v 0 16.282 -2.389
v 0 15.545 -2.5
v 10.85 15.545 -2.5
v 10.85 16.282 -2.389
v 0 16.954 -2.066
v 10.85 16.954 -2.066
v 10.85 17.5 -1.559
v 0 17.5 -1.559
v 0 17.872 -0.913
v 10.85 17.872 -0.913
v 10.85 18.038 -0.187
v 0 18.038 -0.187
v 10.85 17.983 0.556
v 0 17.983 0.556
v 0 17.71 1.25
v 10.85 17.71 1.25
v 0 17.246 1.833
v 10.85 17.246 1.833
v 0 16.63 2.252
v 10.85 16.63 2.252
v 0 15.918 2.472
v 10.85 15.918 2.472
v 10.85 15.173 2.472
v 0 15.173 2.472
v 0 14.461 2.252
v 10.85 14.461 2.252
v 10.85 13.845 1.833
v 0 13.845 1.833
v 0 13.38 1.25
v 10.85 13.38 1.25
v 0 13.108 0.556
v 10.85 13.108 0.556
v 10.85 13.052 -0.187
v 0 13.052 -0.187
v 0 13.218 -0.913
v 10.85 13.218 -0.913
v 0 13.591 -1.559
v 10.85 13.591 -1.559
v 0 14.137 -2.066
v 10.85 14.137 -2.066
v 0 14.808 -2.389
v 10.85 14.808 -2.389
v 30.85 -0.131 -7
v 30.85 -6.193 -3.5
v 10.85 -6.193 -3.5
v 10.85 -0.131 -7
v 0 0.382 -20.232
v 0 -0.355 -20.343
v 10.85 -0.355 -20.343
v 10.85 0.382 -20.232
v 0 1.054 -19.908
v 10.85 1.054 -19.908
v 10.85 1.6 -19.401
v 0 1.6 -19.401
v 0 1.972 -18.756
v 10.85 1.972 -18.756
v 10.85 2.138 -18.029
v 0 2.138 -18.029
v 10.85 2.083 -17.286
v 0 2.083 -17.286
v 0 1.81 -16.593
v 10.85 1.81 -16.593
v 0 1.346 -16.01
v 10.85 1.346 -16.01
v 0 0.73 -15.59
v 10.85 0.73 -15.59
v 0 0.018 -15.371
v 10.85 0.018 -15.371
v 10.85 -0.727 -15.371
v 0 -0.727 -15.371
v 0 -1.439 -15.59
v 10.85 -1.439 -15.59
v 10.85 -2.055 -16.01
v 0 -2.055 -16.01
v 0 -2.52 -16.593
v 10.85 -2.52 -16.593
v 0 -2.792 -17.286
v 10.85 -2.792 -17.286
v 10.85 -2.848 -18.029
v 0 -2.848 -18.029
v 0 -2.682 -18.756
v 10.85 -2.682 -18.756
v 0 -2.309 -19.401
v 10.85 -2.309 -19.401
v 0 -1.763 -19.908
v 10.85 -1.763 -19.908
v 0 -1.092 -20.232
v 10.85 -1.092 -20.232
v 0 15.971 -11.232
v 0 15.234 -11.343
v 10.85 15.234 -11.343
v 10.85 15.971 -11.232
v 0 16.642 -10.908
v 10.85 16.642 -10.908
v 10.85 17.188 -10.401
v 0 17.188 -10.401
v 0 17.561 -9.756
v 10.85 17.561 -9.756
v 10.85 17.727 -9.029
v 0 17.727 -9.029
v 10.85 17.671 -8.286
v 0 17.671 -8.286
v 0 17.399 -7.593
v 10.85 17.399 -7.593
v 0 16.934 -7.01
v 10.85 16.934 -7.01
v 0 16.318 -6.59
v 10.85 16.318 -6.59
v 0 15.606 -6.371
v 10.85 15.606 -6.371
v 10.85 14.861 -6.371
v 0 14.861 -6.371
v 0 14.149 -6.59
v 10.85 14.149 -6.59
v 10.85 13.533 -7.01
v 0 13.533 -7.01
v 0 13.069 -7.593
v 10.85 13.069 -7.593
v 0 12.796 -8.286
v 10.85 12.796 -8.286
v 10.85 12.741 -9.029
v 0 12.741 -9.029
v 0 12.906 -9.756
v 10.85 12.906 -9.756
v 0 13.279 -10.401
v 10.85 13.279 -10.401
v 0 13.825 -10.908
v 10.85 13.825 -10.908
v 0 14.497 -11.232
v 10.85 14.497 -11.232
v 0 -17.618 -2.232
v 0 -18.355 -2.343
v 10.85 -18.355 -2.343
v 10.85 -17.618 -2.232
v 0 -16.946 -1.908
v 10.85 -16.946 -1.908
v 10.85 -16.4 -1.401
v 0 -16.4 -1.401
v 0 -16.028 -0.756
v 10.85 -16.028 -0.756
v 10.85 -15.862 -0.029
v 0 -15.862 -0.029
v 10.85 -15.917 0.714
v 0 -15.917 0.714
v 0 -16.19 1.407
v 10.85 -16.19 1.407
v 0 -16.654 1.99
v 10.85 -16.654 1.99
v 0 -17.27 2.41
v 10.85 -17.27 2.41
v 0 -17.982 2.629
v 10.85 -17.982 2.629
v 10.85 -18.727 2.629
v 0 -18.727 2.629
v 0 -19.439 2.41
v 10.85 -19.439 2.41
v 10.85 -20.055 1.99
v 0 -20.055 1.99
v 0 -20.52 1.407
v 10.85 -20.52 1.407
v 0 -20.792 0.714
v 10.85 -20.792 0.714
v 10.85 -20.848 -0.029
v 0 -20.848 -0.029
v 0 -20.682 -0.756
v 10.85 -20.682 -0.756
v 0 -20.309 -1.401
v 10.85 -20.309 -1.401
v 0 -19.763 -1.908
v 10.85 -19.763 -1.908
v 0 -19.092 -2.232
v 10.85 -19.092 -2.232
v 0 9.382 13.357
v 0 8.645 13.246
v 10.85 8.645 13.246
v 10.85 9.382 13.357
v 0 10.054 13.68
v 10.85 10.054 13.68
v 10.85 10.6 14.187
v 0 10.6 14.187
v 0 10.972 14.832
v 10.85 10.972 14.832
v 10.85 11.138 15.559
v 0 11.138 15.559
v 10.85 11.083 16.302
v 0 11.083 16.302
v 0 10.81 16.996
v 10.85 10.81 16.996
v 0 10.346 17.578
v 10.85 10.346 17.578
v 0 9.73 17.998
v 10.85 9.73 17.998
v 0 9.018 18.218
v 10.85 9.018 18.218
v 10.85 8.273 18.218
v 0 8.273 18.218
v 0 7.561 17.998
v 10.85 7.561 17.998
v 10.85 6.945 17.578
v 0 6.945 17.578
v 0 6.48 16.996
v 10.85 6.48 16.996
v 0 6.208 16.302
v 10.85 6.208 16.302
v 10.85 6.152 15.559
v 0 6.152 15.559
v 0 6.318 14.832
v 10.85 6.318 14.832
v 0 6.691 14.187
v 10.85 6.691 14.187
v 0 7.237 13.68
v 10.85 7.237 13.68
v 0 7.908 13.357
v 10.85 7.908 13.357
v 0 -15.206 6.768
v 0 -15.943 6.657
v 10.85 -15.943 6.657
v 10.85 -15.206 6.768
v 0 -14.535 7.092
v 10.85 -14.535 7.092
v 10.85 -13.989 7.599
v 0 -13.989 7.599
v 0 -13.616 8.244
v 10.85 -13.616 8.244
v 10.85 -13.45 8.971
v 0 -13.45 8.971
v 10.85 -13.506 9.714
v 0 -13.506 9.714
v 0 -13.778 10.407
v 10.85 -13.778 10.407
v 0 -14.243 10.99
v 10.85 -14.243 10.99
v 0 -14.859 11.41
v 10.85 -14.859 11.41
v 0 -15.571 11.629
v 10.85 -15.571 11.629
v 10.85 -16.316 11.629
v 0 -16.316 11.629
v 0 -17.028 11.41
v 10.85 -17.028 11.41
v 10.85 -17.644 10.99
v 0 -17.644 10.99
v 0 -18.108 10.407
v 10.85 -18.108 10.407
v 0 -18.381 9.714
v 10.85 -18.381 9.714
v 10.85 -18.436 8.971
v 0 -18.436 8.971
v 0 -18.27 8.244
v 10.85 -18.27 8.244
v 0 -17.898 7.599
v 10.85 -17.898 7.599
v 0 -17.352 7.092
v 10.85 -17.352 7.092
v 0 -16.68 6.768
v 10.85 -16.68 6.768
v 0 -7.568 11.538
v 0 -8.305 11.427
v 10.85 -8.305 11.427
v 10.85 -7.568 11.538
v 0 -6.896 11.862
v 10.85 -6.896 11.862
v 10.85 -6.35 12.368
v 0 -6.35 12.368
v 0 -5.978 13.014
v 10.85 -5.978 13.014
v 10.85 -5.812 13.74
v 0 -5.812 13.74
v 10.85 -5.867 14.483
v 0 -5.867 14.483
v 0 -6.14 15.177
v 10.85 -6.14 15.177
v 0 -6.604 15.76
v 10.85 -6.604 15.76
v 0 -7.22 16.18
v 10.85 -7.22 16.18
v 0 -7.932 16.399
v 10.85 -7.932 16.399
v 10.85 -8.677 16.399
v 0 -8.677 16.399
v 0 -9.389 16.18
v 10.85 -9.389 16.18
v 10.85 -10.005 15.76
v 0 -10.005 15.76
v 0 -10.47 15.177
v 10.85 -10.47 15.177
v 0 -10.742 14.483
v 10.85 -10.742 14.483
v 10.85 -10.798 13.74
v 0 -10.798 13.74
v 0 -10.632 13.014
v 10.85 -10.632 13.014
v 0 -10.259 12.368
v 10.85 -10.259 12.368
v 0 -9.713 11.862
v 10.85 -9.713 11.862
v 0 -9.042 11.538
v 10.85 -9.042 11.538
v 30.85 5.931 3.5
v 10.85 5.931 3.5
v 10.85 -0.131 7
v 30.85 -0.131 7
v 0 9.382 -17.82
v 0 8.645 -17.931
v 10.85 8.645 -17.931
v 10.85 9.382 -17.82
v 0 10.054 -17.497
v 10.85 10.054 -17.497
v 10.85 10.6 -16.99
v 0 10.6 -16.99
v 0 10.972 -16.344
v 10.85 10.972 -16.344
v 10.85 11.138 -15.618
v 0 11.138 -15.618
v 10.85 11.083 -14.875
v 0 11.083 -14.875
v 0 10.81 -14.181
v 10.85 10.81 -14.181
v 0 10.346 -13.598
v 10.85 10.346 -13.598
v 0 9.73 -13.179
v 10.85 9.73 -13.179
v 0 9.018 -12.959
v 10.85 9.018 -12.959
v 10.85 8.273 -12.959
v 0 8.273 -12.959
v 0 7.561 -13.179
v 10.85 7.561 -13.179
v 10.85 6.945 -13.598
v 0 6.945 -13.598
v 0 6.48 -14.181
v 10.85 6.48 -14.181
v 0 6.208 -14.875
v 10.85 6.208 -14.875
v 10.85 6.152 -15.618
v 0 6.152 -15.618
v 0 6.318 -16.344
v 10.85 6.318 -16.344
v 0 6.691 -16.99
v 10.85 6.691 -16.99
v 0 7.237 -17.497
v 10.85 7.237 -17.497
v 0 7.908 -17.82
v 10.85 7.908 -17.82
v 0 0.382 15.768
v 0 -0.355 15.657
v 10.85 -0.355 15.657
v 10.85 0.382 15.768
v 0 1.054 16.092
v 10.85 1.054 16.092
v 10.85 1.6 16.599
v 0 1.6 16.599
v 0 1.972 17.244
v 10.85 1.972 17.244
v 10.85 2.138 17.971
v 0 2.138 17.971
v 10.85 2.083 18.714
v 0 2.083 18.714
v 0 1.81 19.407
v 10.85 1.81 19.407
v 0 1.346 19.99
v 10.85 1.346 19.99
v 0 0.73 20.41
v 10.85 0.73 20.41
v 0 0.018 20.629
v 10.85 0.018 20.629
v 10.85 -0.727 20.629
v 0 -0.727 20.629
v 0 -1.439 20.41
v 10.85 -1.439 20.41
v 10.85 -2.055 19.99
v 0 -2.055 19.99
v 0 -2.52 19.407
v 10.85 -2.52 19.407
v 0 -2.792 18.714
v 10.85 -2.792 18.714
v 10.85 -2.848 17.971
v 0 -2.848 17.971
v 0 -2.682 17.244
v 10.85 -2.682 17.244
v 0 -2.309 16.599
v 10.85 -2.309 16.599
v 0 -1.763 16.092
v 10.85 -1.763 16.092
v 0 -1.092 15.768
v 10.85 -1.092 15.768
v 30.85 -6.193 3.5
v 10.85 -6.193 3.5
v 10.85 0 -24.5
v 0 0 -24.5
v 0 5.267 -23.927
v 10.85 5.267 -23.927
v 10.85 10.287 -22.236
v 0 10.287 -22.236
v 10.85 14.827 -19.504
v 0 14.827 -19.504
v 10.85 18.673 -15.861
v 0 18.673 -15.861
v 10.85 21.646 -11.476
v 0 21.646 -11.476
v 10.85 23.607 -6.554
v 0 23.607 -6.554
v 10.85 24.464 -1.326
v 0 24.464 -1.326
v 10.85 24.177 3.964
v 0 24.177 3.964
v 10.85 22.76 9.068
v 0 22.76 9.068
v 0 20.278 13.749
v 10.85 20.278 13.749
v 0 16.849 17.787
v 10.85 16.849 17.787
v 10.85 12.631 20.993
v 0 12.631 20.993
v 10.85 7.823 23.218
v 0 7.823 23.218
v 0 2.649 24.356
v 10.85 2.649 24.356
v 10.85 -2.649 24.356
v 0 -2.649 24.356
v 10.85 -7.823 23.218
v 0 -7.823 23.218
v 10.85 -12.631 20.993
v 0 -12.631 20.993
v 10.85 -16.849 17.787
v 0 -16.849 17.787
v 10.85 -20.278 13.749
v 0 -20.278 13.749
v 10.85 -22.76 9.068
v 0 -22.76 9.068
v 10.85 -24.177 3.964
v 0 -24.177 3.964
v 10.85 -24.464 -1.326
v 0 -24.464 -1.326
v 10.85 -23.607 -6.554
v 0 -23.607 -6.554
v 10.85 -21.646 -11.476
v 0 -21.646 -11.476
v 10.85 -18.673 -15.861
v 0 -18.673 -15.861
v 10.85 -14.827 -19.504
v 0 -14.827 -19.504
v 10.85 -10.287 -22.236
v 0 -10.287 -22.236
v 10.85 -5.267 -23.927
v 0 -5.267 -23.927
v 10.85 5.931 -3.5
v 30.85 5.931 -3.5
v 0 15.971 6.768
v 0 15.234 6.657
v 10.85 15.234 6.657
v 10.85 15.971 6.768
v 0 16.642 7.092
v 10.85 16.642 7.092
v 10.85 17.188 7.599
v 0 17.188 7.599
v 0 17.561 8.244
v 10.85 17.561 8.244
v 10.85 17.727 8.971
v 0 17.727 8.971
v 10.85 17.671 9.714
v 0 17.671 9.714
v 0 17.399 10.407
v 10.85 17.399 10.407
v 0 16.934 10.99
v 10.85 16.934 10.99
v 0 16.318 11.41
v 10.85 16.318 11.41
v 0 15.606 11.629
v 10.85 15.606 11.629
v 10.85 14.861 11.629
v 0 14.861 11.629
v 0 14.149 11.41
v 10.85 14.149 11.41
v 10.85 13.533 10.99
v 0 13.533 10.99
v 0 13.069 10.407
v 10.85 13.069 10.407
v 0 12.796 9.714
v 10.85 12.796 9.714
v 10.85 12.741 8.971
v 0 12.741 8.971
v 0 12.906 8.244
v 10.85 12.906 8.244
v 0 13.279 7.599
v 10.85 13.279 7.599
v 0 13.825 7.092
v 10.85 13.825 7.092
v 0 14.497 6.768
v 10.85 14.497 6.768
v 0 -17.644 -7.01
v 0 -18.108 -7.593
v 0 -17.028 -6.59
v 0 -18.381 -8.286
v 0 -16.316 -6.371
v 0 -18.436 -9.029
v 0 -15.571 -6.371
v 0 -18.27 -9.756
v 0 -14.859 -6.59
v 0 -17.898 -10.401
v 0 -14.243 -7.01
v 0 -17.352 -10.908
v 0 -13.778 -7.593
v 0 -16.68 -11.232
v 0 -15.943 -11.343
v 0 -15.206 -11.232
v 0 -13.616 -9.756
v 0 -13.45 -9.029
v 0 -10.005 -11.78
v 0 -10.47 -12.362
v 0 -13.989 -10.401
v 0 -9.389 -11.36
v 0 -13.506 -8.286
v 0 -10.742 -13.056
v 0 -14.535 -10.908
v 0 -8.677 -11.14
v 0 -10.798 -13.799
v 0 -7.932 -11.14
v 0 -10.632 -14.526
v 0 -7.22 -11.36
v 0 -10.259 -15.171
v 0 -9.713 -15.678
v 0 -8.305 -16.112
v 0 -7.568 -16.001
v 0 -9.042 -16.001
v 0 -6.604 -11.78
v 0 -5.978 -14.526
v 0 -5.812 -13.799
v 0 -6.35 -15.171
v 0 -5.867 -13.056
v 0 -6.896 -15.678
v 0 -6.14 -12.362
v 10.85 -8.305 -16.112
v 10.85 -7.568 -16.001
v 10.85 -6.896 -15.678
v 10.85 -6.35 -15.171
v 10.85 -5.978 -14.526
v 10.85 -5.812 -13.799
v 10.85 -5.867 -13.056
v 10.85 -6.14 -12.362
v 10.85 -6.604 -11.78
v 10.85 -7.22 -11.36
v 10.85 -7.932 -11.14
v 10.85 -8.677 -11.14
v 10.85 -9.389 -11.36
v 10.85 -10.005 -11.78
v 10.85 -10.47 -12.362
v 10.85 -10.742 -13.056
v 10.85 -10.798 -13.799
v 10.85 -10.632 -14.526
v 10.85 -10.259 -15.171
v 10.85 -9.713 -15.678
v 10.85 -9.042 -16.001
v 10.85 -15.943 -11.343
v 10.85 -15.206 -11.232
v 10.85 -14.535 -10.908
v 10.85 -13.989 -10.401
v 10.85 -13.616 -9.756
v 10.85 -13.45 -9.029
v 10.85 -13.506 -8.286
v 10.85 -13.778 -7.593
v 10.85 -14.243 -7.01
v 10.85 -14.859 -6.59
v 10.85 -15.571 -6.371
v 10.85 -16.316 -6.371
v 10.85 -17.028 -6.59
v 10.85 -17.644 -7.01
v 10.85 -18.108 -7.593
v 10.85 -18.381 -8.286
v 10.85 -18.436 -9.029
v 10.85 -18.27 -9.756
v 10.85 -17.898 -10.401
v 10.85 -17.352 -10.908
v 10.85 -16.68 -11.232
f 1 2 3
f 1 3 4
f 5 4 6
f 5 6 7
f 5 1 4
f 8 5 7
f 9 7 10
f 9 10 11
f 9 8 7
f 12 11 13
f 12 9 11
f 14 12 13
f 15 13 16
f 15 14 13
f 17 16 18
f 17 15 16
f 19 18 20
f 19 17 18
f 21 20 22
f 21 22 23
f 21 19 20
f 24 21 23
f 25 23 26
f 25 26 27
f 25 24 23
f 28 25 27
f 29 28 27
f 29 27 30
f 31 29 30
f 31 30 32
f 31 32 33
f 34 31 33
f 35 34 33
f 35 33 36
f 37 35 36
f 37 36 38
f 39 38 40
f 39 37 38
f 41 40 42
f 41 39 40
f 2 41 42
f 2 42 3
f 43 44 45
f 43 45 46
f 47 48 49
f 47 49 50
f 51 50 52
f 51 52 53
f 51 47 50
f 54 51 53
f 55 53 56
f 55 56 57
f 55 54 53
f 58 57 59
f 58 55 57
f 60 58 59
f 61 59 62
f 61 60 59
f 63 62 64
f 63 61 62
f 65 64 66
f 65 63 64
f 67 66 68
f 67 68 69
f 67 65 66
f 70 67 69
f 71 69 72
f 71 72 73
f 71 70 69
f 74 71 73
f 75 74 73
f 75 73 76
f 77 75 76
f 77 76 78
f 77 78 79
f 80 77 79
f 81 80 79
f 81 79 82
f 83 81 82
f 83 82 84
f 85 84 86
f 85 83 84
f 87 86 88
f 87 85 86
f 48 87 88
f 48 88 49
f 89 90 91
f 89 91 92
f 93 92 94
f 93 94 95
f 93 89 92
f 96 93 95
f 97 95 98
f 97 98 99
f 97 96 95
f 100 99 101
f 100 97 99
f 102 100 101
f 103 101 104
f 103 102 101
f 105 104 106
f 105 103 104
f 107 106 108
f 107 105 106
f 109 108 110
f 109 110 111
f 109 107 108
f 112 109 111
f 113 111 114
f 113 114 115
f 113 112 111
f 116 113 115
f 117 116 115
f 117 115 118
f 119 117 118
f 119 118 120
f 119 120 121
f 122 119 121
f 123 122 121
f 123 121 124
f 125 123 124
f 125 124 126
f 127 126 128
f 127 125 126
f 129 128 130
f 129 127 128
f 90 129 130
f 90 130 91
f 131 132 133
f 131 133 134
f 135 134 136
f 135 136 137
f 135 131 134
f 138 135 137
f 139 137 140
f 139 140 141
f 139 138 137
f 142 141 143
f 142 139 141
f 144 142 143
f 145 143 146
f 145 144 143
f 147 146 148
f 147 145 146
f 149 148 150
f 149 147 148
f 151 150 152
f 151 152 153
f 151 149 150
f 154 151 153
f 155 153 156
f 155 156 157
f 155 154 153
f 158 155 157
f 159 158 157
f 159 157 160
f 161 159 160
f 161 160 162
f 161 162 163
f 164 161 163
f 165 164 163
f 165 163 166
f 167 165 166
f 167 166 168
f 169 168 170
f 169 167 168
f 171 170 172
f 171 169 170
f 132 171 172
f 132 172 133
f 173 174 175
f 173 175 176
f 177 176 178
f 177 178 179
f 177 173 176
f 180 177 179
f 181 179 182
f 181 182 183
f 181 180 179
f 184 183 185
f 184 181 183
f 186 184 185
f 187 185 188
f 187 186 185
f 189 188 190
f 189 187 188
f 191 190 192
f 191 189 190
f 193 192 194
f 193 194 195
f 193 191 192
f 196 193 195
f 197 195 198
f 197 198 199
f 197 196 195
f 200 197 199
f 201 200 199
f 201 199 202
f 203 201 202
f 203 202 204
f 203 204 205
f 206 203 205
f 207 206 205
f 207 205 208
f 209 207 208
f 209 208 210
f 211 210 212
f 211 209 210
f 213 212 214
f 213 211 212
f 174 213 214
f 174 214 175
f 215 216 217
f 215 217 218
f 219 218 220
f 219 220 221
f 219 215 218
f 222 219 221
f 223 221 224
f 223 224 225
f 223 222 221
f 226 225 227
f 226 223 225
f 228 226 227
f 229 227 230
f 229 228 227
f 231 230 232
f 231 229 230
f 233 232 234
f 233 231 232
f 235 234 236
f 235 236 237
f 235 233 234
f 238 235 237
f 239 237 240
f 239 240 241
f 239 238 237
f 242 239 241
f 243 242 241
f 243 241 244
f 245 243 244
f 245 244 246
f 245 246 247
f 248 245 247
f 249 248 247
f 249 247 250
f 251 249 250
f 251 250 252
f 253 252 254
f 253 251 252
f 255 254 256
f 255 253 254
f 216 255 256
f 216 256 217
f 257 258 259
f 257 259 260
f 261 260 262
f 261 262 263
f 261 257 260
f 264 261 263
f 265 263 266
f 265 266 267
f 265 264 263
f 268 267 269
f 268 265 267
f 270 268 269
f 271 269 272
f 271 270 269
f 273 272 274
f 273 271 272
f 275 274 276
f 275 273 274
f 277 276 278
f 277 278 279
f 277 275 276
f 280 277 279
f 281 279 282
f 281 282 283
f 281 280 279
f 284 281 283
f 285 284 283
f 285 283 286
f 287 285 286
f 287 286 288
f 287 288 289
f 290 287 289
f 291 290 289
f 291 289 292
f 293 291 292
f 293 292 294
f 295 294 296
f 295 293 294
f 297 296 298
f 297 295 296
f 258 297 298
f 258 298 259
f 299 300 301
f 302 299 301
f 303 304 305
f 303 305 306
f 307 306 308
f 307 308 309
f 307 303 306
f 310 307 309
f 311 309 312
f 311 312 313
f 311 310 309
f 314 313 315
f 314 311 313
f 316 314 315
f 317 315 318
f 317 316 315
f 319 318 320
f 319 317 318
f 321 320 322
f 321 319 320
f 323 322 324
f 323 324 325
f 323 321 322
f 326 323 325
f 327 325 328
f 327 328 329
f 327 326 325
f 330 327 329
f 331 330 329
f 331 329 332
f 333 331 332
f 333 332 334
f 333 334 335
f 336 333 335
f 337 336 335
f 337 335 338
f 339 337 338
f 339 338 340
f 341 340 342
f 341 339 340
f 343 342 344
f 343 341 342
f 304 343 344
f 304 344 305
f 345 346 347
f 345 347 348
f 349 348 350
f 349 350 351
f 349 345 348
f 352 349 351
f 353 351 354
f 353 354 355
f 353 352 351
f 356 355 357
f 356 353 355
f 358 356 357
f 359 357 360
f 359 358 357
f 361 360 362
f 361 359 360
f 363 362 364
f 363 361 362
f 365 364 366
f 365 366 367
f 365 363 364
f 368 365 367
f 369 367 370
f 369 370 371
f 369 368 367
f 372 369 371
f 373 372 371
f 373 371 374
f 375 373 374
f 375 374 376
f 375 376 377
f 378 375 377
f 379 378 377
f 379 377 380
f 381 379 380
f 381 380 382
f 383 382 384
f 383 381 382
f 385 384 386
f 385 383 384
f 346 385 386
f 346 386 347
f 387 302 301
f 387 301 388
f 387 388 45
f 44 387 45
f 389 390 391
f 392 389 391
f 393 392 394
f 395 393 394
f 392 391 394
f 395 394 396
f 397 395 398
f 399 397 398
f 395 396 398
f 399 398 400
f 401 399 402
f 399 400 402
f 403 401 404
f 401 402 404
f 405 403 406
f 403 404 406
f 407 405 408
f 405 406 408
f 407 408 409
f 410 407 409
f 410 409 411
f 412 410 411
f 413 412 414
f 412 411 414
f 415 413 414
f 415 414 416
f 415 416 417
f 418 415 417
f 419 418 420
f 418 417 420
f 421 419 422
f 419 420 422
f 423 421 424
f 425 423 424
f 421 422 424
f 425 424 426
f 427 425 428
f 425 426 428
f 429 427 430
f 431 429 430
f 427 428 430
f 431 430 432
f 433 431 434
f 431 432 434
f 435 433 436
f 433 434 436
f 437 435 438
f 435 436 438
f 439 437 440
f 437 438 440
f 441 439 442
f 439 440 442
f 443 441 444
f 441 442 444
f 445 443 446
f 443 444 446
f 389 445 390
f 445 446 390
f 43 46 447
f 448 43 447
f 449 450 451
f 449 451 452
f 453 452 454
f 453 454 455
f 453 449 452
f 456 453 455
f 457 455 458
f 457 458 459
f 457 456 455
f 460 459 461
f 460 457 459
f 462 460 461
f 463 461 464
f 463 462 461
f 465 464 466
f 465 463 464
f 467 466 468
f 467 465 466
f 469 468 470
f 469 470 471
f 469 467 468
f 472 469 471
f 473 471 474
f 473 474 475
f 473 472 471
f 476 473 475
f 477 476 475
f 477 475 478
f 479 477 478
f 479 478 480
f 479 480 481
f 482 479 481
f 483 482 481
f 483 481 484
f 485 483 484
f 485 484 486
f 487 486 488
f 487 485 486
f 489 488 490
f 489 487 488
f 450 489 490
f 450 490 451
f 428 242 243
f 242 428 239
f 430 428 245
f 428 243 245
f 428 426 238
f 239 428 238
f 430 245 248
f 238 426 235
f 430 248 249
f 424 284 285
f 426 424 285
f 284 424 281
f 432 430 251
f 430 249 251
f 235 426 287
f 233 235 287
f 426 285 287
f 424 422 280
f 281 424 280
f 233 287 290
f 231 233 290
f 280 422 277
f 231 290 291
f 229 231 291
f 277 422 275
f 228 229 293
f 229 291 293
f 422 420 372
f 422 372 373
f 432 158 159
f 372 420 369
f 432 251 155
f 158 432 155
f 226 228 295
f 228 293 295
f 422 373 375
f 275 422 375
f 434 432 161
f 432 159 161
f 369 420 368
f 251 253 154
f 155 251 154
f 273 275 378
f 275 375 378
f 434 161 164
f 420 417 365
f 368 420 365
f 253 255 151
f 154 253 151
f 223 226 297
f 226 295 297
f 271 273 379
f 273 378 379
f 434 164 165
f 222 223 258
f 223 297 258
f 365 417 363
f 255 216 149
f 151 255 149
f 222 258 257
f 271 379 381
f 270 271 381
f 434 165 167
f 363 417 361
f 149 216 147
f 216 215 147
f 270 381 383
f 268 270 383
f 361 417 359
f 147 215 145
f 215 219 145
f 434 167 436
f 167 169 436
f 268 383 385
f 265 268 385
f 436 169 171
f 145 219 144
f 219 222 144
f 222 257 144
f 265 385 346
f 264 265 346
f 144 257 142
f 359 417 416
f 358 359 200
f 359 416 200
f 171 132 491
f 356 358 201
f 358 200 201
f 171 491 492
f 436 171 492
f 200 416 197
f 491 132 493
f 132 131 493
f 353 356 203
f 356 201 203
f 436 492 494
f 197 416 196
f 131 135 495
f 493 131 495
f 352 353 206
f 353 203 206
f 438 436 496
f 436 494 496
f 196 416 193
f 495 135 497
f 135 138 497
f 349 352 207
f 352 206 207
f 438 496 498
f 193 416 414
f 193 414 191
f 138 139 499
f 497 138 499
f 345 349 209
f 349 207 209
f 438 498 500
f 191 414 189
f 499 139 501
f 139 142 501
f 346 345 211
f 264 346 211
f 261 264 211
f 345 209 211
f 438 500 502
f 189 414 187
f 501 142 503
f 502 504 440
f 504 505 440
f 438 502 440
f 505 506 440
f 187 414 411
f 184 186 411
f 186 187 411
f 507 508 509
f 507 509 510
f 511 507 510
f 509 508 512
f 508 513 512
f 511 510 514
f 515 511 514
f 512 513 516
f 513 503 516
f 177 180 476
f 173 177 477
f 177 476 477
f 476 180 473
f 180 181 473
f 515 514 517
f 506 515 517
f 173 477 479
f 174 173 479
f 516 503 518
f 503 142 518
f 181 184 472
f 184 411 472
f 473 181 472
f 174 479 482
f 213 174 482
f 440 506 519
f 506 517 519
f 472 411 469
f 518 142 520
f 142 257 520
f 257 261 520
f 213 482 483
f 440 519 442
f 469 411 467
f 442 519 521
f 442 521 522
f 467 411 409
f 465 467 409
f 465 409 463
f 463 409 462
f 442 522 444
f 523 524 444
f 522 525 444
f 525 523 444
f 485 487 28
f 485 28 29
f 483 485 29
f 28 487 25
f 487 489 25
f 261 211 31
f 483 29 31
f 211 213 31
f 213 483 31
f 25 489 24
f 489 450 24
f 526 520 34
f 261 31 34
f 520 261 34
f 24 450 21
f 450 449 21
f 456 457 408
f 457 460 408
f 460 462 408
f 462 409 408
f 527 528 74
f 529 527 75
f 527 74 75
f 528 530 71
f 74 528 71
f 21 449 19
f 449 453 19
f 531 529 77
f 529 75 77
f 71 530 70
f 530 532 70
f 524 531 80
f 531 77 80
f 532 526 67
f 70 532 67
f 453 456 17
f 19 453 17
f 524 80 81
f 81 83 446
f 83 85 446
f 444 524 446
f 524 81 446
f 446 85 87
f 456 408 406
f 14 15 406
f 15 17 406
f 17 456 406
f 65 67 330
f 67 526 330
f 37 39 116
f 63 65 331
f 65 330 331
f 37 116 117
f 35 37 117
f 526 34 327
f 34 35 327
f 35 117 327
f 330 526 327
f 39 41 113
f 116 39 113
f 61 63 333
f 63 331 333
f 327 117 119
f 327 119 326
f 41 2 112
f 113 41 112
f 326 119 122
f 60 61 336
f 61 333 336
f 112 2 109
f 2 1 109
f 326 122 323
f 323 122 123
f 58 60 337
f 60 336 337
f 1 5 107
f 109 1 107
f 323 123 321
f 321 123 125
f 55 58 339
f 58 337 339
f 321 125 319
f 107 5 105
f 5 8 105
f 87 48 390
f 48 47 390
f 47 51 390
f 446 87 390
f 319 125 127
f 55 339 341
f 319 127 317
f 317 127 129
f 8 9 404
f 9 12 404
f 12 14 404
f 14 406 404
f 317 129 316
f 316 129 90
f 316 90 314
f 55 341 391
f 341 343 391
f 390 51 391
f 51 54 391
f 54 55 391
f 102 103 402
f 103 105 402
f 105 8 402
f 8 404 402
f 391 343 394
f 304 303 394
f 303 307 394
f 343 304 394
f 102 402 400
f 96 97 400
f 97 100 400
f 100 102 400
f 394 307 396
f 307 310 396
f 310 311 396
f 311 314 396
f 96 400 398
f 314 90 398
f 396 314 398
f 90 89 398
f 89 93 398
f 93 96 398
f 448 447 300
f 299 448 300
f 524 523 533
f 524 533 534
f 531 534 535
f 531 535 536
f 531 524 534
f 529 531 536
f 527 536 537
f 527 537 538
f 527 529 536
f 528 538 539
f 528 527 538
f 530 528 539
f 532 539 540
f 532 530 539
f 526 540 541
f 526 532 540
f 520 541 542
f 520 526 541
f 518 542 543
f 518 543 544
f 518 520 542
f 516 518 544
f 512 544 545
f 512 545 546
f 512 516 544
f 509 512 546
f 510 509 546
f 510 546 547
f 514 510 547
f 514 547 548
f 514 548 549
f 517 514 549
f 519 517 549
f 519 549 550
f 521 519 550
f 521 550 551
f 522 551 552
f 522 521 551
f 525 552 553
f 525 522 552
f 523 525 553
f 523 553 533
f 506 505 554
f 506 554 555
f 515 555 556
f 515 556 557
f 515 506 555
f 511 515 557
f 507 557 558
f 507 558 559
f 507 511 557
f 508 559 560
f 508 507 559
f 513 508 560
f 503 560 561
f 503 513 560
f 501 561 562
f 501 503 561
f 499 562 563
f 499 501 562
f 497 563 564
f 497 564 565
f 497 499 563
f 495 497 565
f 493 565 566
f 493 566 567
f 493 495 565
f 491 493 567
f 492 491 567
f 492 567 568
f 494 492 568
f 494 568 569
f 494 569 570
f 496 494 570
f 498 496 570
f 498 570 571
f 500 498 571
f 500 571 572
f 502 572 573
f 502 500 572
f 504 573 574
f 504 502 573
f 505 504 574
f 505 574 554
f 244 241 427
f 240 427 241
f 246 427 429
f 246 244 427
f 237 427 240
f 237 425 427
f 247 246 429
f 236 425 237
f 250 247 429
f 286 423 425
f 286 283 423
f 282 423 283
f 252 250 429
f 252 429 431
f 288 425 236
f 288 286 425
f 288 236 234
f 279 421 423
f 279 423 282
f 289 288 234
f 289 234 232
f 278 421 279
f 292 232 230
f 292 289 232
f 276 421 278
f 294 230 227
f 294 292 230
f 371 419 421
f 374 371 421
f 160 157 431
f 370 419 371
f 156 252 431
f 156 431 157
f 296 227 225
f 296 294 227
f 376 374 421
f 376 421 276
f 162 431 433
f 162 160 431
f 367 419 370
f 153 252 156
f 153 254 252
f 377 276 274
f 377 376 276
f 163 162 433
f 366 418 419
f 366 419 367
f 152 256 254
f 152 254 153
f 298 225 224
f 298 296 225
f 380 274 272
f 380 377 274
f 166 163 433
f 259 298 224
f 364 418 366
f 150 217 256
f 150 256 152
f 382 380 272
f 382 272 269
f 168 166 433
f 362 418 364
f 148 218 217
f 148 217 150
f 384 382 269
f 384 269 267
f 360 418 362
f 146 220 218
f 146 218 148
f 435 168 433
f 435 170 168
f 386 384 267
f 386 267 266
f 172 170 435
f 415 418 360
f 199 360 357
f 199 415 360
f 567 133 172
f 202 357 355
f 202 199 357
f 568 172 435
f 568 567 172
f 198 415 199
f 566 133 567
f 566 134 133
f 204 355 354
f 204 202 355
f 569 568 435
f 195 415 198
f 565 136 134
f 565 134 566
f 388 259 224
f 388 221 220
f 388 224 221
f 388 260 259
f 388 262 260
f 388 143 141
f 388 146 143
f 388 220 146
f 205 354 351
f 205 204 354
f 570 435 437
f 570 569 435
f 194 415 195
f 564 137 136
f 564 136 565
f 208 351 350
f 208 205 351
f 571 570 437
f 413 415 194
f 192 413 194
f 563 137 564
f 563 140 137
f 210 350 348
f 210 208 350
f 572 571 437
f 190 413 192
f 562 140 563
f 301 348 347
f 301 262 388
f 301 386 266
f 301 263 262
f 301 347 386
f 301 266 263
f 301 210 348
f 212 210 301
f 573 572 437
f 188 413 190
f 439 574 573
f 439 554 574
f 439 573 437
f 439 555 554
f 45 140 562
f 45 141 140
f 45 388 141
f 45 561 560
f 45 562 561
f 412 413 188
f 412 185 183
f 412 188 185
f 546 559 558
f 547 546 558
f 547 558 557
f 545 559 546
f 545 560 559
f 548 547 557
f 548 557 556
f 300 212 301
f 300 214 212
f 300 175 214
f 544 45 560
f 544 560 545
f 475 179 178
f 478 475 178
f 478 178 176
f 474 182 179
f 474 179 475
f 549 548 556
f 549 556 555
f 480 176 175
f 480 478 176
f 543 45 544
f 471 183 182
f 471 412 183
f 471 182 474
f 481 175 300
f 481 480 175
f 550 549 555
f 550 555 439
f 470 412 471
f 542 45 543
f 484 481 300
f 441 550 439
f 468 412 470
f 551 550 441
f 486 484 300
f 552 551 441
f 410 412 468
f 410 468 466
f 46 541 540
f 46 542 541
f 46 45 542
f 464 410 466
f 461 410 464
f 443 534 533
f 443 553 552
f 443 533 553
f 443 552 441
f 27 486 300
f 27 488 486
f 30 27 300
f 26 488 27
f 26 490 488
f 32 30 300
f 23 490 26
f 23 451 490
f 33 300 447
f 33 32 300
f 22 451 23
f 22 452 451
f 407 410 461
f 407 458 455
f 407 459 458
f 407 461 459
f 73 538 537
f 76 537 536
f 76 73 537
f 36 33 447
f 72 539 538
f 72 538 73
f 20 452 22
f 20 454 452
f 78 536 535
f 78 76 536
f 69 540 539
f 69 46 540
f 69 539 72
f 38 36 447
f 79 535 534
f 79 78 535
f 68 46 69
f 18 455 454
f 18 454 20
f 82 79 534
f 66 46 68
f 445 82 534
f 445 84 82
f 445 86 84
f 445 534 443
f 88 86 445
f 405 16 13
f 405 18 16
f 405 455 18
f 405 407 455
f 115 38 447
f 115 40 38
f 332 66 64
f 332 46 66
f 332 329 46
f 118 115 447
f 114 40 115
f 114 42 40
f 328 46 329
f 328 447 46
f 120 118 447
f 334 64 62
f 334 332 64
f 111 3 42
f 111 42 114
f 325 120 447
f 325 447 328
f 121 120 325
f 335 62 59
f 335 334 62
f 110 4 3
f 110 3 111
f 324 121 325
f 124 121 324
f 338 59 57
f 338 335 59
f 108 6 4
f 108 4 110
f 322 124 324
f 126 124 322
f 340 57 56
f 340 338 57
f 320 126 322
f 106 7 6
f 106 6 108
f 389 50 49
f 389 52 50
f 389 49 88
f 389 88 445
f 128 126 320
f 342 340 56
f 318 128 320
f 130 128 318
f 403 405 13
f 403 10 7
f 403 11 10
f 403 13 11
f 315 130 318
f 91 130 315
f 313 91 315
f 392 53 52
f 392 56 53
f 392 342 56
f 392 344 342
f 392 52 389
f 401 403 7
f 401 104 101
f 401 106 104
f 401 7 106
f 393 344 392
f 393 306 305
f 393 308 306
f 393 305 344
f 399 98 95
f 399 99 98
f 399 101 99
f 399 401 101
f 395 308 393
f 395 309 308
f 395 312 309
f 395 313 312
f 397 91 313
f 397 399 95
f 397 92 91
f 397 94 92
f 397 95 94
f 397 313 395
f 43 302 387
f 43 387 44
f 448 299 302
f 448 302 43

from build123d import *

# Parameters (mm, degrees)
SKETCH1_R           = 24.5
SKETCH1_R_2         = 2.5
BOSS_EXTRUDE1_DEPTH = 10.85
BOSS_EXTRUDE2_DEPTH = 20


with BuildPart() as part:
    # Sketch1 → Boss-Extrude1 (new body)
    with BuildSketch(Plane(origin=(0, 0, 0), x_dir=(0, 0, -1), z_dir=(1, 0, 0))):
        Circle(SKETCH1_R)
        with Locations((0, 15.545215773)):
            Circle(SKETCH1_R_2, mode=Mode.SUBTRACT)
        with Locations((13.612452271, -8.304784227)):
            Circle(SKETCH1_R_2, mode=Mode.SUBTRACT)
        with Locations((-13.927155569, -8.304784227)):
            Circle(SKETCH1_R_2, mode=Mode.SUBTRACT)
        with Locations((8.842648351, 15.233673041)):
            Circle(SKETCH1_R_2, mode=Mode.SUBTRACT)
        with Locations((15.431105619, 8.645215773)):
            Circle(SKETCH1_R_2, mode=Mode.SUBTRACT)
        with Locations((17.842648351, -0.354784227)):
            Circle(SKETCH1_R_2, mode=Mode.SUBTRACT)
        with Locations((8.842648351, -15.943241495)):
            Circle(SKETCH1_R_2, mode=Mode.SUBTRACT)
        with Locations((-0.157351649, -18.354784227)):
            Circle(SKETCH1_R_2, mode=Mode.SUBTRACT)
        with Locations((-9.157351649, -15.943241495)):
            Circle(SKETCH1_R_2, mode=Mode.SUBTRACT)
        with Locations((-18.157351649, -0.354784227)):
            Circle(SKETCH1_R_2, mode=Mode.SUBTRACT)
        with Locations((-15.745808917, 8.645215773)):
            Circle(SKETCH1_R_2, mode=Mode.SUBTRACT)
        with Locations((-9.157351649, 15.233673041)):
            Circle(SKETCH1_R_2, mode=Mode.SUBTRACT)
    extrude(amount=BOSS_EXTRUDE1_DEPTH)

    # Sketch4 → Boss-Extrude2 (add)
    with BuildSketch(Plane(origin=(10.85, 0, 0), x_dir=(0, 0, -1), z_dir=(1, 0, 0))):
        Polygon((7, -0.130869058), (3.5, 5.931308769), (-3.5, 5.931308769), (-7, -0.130869058), (-3.5, -6.193046884), (3.5, -6.193046884), align=None)
    extrude(amount=BOSS_EXTRUDE2_DEPTH)


solid = part.part
